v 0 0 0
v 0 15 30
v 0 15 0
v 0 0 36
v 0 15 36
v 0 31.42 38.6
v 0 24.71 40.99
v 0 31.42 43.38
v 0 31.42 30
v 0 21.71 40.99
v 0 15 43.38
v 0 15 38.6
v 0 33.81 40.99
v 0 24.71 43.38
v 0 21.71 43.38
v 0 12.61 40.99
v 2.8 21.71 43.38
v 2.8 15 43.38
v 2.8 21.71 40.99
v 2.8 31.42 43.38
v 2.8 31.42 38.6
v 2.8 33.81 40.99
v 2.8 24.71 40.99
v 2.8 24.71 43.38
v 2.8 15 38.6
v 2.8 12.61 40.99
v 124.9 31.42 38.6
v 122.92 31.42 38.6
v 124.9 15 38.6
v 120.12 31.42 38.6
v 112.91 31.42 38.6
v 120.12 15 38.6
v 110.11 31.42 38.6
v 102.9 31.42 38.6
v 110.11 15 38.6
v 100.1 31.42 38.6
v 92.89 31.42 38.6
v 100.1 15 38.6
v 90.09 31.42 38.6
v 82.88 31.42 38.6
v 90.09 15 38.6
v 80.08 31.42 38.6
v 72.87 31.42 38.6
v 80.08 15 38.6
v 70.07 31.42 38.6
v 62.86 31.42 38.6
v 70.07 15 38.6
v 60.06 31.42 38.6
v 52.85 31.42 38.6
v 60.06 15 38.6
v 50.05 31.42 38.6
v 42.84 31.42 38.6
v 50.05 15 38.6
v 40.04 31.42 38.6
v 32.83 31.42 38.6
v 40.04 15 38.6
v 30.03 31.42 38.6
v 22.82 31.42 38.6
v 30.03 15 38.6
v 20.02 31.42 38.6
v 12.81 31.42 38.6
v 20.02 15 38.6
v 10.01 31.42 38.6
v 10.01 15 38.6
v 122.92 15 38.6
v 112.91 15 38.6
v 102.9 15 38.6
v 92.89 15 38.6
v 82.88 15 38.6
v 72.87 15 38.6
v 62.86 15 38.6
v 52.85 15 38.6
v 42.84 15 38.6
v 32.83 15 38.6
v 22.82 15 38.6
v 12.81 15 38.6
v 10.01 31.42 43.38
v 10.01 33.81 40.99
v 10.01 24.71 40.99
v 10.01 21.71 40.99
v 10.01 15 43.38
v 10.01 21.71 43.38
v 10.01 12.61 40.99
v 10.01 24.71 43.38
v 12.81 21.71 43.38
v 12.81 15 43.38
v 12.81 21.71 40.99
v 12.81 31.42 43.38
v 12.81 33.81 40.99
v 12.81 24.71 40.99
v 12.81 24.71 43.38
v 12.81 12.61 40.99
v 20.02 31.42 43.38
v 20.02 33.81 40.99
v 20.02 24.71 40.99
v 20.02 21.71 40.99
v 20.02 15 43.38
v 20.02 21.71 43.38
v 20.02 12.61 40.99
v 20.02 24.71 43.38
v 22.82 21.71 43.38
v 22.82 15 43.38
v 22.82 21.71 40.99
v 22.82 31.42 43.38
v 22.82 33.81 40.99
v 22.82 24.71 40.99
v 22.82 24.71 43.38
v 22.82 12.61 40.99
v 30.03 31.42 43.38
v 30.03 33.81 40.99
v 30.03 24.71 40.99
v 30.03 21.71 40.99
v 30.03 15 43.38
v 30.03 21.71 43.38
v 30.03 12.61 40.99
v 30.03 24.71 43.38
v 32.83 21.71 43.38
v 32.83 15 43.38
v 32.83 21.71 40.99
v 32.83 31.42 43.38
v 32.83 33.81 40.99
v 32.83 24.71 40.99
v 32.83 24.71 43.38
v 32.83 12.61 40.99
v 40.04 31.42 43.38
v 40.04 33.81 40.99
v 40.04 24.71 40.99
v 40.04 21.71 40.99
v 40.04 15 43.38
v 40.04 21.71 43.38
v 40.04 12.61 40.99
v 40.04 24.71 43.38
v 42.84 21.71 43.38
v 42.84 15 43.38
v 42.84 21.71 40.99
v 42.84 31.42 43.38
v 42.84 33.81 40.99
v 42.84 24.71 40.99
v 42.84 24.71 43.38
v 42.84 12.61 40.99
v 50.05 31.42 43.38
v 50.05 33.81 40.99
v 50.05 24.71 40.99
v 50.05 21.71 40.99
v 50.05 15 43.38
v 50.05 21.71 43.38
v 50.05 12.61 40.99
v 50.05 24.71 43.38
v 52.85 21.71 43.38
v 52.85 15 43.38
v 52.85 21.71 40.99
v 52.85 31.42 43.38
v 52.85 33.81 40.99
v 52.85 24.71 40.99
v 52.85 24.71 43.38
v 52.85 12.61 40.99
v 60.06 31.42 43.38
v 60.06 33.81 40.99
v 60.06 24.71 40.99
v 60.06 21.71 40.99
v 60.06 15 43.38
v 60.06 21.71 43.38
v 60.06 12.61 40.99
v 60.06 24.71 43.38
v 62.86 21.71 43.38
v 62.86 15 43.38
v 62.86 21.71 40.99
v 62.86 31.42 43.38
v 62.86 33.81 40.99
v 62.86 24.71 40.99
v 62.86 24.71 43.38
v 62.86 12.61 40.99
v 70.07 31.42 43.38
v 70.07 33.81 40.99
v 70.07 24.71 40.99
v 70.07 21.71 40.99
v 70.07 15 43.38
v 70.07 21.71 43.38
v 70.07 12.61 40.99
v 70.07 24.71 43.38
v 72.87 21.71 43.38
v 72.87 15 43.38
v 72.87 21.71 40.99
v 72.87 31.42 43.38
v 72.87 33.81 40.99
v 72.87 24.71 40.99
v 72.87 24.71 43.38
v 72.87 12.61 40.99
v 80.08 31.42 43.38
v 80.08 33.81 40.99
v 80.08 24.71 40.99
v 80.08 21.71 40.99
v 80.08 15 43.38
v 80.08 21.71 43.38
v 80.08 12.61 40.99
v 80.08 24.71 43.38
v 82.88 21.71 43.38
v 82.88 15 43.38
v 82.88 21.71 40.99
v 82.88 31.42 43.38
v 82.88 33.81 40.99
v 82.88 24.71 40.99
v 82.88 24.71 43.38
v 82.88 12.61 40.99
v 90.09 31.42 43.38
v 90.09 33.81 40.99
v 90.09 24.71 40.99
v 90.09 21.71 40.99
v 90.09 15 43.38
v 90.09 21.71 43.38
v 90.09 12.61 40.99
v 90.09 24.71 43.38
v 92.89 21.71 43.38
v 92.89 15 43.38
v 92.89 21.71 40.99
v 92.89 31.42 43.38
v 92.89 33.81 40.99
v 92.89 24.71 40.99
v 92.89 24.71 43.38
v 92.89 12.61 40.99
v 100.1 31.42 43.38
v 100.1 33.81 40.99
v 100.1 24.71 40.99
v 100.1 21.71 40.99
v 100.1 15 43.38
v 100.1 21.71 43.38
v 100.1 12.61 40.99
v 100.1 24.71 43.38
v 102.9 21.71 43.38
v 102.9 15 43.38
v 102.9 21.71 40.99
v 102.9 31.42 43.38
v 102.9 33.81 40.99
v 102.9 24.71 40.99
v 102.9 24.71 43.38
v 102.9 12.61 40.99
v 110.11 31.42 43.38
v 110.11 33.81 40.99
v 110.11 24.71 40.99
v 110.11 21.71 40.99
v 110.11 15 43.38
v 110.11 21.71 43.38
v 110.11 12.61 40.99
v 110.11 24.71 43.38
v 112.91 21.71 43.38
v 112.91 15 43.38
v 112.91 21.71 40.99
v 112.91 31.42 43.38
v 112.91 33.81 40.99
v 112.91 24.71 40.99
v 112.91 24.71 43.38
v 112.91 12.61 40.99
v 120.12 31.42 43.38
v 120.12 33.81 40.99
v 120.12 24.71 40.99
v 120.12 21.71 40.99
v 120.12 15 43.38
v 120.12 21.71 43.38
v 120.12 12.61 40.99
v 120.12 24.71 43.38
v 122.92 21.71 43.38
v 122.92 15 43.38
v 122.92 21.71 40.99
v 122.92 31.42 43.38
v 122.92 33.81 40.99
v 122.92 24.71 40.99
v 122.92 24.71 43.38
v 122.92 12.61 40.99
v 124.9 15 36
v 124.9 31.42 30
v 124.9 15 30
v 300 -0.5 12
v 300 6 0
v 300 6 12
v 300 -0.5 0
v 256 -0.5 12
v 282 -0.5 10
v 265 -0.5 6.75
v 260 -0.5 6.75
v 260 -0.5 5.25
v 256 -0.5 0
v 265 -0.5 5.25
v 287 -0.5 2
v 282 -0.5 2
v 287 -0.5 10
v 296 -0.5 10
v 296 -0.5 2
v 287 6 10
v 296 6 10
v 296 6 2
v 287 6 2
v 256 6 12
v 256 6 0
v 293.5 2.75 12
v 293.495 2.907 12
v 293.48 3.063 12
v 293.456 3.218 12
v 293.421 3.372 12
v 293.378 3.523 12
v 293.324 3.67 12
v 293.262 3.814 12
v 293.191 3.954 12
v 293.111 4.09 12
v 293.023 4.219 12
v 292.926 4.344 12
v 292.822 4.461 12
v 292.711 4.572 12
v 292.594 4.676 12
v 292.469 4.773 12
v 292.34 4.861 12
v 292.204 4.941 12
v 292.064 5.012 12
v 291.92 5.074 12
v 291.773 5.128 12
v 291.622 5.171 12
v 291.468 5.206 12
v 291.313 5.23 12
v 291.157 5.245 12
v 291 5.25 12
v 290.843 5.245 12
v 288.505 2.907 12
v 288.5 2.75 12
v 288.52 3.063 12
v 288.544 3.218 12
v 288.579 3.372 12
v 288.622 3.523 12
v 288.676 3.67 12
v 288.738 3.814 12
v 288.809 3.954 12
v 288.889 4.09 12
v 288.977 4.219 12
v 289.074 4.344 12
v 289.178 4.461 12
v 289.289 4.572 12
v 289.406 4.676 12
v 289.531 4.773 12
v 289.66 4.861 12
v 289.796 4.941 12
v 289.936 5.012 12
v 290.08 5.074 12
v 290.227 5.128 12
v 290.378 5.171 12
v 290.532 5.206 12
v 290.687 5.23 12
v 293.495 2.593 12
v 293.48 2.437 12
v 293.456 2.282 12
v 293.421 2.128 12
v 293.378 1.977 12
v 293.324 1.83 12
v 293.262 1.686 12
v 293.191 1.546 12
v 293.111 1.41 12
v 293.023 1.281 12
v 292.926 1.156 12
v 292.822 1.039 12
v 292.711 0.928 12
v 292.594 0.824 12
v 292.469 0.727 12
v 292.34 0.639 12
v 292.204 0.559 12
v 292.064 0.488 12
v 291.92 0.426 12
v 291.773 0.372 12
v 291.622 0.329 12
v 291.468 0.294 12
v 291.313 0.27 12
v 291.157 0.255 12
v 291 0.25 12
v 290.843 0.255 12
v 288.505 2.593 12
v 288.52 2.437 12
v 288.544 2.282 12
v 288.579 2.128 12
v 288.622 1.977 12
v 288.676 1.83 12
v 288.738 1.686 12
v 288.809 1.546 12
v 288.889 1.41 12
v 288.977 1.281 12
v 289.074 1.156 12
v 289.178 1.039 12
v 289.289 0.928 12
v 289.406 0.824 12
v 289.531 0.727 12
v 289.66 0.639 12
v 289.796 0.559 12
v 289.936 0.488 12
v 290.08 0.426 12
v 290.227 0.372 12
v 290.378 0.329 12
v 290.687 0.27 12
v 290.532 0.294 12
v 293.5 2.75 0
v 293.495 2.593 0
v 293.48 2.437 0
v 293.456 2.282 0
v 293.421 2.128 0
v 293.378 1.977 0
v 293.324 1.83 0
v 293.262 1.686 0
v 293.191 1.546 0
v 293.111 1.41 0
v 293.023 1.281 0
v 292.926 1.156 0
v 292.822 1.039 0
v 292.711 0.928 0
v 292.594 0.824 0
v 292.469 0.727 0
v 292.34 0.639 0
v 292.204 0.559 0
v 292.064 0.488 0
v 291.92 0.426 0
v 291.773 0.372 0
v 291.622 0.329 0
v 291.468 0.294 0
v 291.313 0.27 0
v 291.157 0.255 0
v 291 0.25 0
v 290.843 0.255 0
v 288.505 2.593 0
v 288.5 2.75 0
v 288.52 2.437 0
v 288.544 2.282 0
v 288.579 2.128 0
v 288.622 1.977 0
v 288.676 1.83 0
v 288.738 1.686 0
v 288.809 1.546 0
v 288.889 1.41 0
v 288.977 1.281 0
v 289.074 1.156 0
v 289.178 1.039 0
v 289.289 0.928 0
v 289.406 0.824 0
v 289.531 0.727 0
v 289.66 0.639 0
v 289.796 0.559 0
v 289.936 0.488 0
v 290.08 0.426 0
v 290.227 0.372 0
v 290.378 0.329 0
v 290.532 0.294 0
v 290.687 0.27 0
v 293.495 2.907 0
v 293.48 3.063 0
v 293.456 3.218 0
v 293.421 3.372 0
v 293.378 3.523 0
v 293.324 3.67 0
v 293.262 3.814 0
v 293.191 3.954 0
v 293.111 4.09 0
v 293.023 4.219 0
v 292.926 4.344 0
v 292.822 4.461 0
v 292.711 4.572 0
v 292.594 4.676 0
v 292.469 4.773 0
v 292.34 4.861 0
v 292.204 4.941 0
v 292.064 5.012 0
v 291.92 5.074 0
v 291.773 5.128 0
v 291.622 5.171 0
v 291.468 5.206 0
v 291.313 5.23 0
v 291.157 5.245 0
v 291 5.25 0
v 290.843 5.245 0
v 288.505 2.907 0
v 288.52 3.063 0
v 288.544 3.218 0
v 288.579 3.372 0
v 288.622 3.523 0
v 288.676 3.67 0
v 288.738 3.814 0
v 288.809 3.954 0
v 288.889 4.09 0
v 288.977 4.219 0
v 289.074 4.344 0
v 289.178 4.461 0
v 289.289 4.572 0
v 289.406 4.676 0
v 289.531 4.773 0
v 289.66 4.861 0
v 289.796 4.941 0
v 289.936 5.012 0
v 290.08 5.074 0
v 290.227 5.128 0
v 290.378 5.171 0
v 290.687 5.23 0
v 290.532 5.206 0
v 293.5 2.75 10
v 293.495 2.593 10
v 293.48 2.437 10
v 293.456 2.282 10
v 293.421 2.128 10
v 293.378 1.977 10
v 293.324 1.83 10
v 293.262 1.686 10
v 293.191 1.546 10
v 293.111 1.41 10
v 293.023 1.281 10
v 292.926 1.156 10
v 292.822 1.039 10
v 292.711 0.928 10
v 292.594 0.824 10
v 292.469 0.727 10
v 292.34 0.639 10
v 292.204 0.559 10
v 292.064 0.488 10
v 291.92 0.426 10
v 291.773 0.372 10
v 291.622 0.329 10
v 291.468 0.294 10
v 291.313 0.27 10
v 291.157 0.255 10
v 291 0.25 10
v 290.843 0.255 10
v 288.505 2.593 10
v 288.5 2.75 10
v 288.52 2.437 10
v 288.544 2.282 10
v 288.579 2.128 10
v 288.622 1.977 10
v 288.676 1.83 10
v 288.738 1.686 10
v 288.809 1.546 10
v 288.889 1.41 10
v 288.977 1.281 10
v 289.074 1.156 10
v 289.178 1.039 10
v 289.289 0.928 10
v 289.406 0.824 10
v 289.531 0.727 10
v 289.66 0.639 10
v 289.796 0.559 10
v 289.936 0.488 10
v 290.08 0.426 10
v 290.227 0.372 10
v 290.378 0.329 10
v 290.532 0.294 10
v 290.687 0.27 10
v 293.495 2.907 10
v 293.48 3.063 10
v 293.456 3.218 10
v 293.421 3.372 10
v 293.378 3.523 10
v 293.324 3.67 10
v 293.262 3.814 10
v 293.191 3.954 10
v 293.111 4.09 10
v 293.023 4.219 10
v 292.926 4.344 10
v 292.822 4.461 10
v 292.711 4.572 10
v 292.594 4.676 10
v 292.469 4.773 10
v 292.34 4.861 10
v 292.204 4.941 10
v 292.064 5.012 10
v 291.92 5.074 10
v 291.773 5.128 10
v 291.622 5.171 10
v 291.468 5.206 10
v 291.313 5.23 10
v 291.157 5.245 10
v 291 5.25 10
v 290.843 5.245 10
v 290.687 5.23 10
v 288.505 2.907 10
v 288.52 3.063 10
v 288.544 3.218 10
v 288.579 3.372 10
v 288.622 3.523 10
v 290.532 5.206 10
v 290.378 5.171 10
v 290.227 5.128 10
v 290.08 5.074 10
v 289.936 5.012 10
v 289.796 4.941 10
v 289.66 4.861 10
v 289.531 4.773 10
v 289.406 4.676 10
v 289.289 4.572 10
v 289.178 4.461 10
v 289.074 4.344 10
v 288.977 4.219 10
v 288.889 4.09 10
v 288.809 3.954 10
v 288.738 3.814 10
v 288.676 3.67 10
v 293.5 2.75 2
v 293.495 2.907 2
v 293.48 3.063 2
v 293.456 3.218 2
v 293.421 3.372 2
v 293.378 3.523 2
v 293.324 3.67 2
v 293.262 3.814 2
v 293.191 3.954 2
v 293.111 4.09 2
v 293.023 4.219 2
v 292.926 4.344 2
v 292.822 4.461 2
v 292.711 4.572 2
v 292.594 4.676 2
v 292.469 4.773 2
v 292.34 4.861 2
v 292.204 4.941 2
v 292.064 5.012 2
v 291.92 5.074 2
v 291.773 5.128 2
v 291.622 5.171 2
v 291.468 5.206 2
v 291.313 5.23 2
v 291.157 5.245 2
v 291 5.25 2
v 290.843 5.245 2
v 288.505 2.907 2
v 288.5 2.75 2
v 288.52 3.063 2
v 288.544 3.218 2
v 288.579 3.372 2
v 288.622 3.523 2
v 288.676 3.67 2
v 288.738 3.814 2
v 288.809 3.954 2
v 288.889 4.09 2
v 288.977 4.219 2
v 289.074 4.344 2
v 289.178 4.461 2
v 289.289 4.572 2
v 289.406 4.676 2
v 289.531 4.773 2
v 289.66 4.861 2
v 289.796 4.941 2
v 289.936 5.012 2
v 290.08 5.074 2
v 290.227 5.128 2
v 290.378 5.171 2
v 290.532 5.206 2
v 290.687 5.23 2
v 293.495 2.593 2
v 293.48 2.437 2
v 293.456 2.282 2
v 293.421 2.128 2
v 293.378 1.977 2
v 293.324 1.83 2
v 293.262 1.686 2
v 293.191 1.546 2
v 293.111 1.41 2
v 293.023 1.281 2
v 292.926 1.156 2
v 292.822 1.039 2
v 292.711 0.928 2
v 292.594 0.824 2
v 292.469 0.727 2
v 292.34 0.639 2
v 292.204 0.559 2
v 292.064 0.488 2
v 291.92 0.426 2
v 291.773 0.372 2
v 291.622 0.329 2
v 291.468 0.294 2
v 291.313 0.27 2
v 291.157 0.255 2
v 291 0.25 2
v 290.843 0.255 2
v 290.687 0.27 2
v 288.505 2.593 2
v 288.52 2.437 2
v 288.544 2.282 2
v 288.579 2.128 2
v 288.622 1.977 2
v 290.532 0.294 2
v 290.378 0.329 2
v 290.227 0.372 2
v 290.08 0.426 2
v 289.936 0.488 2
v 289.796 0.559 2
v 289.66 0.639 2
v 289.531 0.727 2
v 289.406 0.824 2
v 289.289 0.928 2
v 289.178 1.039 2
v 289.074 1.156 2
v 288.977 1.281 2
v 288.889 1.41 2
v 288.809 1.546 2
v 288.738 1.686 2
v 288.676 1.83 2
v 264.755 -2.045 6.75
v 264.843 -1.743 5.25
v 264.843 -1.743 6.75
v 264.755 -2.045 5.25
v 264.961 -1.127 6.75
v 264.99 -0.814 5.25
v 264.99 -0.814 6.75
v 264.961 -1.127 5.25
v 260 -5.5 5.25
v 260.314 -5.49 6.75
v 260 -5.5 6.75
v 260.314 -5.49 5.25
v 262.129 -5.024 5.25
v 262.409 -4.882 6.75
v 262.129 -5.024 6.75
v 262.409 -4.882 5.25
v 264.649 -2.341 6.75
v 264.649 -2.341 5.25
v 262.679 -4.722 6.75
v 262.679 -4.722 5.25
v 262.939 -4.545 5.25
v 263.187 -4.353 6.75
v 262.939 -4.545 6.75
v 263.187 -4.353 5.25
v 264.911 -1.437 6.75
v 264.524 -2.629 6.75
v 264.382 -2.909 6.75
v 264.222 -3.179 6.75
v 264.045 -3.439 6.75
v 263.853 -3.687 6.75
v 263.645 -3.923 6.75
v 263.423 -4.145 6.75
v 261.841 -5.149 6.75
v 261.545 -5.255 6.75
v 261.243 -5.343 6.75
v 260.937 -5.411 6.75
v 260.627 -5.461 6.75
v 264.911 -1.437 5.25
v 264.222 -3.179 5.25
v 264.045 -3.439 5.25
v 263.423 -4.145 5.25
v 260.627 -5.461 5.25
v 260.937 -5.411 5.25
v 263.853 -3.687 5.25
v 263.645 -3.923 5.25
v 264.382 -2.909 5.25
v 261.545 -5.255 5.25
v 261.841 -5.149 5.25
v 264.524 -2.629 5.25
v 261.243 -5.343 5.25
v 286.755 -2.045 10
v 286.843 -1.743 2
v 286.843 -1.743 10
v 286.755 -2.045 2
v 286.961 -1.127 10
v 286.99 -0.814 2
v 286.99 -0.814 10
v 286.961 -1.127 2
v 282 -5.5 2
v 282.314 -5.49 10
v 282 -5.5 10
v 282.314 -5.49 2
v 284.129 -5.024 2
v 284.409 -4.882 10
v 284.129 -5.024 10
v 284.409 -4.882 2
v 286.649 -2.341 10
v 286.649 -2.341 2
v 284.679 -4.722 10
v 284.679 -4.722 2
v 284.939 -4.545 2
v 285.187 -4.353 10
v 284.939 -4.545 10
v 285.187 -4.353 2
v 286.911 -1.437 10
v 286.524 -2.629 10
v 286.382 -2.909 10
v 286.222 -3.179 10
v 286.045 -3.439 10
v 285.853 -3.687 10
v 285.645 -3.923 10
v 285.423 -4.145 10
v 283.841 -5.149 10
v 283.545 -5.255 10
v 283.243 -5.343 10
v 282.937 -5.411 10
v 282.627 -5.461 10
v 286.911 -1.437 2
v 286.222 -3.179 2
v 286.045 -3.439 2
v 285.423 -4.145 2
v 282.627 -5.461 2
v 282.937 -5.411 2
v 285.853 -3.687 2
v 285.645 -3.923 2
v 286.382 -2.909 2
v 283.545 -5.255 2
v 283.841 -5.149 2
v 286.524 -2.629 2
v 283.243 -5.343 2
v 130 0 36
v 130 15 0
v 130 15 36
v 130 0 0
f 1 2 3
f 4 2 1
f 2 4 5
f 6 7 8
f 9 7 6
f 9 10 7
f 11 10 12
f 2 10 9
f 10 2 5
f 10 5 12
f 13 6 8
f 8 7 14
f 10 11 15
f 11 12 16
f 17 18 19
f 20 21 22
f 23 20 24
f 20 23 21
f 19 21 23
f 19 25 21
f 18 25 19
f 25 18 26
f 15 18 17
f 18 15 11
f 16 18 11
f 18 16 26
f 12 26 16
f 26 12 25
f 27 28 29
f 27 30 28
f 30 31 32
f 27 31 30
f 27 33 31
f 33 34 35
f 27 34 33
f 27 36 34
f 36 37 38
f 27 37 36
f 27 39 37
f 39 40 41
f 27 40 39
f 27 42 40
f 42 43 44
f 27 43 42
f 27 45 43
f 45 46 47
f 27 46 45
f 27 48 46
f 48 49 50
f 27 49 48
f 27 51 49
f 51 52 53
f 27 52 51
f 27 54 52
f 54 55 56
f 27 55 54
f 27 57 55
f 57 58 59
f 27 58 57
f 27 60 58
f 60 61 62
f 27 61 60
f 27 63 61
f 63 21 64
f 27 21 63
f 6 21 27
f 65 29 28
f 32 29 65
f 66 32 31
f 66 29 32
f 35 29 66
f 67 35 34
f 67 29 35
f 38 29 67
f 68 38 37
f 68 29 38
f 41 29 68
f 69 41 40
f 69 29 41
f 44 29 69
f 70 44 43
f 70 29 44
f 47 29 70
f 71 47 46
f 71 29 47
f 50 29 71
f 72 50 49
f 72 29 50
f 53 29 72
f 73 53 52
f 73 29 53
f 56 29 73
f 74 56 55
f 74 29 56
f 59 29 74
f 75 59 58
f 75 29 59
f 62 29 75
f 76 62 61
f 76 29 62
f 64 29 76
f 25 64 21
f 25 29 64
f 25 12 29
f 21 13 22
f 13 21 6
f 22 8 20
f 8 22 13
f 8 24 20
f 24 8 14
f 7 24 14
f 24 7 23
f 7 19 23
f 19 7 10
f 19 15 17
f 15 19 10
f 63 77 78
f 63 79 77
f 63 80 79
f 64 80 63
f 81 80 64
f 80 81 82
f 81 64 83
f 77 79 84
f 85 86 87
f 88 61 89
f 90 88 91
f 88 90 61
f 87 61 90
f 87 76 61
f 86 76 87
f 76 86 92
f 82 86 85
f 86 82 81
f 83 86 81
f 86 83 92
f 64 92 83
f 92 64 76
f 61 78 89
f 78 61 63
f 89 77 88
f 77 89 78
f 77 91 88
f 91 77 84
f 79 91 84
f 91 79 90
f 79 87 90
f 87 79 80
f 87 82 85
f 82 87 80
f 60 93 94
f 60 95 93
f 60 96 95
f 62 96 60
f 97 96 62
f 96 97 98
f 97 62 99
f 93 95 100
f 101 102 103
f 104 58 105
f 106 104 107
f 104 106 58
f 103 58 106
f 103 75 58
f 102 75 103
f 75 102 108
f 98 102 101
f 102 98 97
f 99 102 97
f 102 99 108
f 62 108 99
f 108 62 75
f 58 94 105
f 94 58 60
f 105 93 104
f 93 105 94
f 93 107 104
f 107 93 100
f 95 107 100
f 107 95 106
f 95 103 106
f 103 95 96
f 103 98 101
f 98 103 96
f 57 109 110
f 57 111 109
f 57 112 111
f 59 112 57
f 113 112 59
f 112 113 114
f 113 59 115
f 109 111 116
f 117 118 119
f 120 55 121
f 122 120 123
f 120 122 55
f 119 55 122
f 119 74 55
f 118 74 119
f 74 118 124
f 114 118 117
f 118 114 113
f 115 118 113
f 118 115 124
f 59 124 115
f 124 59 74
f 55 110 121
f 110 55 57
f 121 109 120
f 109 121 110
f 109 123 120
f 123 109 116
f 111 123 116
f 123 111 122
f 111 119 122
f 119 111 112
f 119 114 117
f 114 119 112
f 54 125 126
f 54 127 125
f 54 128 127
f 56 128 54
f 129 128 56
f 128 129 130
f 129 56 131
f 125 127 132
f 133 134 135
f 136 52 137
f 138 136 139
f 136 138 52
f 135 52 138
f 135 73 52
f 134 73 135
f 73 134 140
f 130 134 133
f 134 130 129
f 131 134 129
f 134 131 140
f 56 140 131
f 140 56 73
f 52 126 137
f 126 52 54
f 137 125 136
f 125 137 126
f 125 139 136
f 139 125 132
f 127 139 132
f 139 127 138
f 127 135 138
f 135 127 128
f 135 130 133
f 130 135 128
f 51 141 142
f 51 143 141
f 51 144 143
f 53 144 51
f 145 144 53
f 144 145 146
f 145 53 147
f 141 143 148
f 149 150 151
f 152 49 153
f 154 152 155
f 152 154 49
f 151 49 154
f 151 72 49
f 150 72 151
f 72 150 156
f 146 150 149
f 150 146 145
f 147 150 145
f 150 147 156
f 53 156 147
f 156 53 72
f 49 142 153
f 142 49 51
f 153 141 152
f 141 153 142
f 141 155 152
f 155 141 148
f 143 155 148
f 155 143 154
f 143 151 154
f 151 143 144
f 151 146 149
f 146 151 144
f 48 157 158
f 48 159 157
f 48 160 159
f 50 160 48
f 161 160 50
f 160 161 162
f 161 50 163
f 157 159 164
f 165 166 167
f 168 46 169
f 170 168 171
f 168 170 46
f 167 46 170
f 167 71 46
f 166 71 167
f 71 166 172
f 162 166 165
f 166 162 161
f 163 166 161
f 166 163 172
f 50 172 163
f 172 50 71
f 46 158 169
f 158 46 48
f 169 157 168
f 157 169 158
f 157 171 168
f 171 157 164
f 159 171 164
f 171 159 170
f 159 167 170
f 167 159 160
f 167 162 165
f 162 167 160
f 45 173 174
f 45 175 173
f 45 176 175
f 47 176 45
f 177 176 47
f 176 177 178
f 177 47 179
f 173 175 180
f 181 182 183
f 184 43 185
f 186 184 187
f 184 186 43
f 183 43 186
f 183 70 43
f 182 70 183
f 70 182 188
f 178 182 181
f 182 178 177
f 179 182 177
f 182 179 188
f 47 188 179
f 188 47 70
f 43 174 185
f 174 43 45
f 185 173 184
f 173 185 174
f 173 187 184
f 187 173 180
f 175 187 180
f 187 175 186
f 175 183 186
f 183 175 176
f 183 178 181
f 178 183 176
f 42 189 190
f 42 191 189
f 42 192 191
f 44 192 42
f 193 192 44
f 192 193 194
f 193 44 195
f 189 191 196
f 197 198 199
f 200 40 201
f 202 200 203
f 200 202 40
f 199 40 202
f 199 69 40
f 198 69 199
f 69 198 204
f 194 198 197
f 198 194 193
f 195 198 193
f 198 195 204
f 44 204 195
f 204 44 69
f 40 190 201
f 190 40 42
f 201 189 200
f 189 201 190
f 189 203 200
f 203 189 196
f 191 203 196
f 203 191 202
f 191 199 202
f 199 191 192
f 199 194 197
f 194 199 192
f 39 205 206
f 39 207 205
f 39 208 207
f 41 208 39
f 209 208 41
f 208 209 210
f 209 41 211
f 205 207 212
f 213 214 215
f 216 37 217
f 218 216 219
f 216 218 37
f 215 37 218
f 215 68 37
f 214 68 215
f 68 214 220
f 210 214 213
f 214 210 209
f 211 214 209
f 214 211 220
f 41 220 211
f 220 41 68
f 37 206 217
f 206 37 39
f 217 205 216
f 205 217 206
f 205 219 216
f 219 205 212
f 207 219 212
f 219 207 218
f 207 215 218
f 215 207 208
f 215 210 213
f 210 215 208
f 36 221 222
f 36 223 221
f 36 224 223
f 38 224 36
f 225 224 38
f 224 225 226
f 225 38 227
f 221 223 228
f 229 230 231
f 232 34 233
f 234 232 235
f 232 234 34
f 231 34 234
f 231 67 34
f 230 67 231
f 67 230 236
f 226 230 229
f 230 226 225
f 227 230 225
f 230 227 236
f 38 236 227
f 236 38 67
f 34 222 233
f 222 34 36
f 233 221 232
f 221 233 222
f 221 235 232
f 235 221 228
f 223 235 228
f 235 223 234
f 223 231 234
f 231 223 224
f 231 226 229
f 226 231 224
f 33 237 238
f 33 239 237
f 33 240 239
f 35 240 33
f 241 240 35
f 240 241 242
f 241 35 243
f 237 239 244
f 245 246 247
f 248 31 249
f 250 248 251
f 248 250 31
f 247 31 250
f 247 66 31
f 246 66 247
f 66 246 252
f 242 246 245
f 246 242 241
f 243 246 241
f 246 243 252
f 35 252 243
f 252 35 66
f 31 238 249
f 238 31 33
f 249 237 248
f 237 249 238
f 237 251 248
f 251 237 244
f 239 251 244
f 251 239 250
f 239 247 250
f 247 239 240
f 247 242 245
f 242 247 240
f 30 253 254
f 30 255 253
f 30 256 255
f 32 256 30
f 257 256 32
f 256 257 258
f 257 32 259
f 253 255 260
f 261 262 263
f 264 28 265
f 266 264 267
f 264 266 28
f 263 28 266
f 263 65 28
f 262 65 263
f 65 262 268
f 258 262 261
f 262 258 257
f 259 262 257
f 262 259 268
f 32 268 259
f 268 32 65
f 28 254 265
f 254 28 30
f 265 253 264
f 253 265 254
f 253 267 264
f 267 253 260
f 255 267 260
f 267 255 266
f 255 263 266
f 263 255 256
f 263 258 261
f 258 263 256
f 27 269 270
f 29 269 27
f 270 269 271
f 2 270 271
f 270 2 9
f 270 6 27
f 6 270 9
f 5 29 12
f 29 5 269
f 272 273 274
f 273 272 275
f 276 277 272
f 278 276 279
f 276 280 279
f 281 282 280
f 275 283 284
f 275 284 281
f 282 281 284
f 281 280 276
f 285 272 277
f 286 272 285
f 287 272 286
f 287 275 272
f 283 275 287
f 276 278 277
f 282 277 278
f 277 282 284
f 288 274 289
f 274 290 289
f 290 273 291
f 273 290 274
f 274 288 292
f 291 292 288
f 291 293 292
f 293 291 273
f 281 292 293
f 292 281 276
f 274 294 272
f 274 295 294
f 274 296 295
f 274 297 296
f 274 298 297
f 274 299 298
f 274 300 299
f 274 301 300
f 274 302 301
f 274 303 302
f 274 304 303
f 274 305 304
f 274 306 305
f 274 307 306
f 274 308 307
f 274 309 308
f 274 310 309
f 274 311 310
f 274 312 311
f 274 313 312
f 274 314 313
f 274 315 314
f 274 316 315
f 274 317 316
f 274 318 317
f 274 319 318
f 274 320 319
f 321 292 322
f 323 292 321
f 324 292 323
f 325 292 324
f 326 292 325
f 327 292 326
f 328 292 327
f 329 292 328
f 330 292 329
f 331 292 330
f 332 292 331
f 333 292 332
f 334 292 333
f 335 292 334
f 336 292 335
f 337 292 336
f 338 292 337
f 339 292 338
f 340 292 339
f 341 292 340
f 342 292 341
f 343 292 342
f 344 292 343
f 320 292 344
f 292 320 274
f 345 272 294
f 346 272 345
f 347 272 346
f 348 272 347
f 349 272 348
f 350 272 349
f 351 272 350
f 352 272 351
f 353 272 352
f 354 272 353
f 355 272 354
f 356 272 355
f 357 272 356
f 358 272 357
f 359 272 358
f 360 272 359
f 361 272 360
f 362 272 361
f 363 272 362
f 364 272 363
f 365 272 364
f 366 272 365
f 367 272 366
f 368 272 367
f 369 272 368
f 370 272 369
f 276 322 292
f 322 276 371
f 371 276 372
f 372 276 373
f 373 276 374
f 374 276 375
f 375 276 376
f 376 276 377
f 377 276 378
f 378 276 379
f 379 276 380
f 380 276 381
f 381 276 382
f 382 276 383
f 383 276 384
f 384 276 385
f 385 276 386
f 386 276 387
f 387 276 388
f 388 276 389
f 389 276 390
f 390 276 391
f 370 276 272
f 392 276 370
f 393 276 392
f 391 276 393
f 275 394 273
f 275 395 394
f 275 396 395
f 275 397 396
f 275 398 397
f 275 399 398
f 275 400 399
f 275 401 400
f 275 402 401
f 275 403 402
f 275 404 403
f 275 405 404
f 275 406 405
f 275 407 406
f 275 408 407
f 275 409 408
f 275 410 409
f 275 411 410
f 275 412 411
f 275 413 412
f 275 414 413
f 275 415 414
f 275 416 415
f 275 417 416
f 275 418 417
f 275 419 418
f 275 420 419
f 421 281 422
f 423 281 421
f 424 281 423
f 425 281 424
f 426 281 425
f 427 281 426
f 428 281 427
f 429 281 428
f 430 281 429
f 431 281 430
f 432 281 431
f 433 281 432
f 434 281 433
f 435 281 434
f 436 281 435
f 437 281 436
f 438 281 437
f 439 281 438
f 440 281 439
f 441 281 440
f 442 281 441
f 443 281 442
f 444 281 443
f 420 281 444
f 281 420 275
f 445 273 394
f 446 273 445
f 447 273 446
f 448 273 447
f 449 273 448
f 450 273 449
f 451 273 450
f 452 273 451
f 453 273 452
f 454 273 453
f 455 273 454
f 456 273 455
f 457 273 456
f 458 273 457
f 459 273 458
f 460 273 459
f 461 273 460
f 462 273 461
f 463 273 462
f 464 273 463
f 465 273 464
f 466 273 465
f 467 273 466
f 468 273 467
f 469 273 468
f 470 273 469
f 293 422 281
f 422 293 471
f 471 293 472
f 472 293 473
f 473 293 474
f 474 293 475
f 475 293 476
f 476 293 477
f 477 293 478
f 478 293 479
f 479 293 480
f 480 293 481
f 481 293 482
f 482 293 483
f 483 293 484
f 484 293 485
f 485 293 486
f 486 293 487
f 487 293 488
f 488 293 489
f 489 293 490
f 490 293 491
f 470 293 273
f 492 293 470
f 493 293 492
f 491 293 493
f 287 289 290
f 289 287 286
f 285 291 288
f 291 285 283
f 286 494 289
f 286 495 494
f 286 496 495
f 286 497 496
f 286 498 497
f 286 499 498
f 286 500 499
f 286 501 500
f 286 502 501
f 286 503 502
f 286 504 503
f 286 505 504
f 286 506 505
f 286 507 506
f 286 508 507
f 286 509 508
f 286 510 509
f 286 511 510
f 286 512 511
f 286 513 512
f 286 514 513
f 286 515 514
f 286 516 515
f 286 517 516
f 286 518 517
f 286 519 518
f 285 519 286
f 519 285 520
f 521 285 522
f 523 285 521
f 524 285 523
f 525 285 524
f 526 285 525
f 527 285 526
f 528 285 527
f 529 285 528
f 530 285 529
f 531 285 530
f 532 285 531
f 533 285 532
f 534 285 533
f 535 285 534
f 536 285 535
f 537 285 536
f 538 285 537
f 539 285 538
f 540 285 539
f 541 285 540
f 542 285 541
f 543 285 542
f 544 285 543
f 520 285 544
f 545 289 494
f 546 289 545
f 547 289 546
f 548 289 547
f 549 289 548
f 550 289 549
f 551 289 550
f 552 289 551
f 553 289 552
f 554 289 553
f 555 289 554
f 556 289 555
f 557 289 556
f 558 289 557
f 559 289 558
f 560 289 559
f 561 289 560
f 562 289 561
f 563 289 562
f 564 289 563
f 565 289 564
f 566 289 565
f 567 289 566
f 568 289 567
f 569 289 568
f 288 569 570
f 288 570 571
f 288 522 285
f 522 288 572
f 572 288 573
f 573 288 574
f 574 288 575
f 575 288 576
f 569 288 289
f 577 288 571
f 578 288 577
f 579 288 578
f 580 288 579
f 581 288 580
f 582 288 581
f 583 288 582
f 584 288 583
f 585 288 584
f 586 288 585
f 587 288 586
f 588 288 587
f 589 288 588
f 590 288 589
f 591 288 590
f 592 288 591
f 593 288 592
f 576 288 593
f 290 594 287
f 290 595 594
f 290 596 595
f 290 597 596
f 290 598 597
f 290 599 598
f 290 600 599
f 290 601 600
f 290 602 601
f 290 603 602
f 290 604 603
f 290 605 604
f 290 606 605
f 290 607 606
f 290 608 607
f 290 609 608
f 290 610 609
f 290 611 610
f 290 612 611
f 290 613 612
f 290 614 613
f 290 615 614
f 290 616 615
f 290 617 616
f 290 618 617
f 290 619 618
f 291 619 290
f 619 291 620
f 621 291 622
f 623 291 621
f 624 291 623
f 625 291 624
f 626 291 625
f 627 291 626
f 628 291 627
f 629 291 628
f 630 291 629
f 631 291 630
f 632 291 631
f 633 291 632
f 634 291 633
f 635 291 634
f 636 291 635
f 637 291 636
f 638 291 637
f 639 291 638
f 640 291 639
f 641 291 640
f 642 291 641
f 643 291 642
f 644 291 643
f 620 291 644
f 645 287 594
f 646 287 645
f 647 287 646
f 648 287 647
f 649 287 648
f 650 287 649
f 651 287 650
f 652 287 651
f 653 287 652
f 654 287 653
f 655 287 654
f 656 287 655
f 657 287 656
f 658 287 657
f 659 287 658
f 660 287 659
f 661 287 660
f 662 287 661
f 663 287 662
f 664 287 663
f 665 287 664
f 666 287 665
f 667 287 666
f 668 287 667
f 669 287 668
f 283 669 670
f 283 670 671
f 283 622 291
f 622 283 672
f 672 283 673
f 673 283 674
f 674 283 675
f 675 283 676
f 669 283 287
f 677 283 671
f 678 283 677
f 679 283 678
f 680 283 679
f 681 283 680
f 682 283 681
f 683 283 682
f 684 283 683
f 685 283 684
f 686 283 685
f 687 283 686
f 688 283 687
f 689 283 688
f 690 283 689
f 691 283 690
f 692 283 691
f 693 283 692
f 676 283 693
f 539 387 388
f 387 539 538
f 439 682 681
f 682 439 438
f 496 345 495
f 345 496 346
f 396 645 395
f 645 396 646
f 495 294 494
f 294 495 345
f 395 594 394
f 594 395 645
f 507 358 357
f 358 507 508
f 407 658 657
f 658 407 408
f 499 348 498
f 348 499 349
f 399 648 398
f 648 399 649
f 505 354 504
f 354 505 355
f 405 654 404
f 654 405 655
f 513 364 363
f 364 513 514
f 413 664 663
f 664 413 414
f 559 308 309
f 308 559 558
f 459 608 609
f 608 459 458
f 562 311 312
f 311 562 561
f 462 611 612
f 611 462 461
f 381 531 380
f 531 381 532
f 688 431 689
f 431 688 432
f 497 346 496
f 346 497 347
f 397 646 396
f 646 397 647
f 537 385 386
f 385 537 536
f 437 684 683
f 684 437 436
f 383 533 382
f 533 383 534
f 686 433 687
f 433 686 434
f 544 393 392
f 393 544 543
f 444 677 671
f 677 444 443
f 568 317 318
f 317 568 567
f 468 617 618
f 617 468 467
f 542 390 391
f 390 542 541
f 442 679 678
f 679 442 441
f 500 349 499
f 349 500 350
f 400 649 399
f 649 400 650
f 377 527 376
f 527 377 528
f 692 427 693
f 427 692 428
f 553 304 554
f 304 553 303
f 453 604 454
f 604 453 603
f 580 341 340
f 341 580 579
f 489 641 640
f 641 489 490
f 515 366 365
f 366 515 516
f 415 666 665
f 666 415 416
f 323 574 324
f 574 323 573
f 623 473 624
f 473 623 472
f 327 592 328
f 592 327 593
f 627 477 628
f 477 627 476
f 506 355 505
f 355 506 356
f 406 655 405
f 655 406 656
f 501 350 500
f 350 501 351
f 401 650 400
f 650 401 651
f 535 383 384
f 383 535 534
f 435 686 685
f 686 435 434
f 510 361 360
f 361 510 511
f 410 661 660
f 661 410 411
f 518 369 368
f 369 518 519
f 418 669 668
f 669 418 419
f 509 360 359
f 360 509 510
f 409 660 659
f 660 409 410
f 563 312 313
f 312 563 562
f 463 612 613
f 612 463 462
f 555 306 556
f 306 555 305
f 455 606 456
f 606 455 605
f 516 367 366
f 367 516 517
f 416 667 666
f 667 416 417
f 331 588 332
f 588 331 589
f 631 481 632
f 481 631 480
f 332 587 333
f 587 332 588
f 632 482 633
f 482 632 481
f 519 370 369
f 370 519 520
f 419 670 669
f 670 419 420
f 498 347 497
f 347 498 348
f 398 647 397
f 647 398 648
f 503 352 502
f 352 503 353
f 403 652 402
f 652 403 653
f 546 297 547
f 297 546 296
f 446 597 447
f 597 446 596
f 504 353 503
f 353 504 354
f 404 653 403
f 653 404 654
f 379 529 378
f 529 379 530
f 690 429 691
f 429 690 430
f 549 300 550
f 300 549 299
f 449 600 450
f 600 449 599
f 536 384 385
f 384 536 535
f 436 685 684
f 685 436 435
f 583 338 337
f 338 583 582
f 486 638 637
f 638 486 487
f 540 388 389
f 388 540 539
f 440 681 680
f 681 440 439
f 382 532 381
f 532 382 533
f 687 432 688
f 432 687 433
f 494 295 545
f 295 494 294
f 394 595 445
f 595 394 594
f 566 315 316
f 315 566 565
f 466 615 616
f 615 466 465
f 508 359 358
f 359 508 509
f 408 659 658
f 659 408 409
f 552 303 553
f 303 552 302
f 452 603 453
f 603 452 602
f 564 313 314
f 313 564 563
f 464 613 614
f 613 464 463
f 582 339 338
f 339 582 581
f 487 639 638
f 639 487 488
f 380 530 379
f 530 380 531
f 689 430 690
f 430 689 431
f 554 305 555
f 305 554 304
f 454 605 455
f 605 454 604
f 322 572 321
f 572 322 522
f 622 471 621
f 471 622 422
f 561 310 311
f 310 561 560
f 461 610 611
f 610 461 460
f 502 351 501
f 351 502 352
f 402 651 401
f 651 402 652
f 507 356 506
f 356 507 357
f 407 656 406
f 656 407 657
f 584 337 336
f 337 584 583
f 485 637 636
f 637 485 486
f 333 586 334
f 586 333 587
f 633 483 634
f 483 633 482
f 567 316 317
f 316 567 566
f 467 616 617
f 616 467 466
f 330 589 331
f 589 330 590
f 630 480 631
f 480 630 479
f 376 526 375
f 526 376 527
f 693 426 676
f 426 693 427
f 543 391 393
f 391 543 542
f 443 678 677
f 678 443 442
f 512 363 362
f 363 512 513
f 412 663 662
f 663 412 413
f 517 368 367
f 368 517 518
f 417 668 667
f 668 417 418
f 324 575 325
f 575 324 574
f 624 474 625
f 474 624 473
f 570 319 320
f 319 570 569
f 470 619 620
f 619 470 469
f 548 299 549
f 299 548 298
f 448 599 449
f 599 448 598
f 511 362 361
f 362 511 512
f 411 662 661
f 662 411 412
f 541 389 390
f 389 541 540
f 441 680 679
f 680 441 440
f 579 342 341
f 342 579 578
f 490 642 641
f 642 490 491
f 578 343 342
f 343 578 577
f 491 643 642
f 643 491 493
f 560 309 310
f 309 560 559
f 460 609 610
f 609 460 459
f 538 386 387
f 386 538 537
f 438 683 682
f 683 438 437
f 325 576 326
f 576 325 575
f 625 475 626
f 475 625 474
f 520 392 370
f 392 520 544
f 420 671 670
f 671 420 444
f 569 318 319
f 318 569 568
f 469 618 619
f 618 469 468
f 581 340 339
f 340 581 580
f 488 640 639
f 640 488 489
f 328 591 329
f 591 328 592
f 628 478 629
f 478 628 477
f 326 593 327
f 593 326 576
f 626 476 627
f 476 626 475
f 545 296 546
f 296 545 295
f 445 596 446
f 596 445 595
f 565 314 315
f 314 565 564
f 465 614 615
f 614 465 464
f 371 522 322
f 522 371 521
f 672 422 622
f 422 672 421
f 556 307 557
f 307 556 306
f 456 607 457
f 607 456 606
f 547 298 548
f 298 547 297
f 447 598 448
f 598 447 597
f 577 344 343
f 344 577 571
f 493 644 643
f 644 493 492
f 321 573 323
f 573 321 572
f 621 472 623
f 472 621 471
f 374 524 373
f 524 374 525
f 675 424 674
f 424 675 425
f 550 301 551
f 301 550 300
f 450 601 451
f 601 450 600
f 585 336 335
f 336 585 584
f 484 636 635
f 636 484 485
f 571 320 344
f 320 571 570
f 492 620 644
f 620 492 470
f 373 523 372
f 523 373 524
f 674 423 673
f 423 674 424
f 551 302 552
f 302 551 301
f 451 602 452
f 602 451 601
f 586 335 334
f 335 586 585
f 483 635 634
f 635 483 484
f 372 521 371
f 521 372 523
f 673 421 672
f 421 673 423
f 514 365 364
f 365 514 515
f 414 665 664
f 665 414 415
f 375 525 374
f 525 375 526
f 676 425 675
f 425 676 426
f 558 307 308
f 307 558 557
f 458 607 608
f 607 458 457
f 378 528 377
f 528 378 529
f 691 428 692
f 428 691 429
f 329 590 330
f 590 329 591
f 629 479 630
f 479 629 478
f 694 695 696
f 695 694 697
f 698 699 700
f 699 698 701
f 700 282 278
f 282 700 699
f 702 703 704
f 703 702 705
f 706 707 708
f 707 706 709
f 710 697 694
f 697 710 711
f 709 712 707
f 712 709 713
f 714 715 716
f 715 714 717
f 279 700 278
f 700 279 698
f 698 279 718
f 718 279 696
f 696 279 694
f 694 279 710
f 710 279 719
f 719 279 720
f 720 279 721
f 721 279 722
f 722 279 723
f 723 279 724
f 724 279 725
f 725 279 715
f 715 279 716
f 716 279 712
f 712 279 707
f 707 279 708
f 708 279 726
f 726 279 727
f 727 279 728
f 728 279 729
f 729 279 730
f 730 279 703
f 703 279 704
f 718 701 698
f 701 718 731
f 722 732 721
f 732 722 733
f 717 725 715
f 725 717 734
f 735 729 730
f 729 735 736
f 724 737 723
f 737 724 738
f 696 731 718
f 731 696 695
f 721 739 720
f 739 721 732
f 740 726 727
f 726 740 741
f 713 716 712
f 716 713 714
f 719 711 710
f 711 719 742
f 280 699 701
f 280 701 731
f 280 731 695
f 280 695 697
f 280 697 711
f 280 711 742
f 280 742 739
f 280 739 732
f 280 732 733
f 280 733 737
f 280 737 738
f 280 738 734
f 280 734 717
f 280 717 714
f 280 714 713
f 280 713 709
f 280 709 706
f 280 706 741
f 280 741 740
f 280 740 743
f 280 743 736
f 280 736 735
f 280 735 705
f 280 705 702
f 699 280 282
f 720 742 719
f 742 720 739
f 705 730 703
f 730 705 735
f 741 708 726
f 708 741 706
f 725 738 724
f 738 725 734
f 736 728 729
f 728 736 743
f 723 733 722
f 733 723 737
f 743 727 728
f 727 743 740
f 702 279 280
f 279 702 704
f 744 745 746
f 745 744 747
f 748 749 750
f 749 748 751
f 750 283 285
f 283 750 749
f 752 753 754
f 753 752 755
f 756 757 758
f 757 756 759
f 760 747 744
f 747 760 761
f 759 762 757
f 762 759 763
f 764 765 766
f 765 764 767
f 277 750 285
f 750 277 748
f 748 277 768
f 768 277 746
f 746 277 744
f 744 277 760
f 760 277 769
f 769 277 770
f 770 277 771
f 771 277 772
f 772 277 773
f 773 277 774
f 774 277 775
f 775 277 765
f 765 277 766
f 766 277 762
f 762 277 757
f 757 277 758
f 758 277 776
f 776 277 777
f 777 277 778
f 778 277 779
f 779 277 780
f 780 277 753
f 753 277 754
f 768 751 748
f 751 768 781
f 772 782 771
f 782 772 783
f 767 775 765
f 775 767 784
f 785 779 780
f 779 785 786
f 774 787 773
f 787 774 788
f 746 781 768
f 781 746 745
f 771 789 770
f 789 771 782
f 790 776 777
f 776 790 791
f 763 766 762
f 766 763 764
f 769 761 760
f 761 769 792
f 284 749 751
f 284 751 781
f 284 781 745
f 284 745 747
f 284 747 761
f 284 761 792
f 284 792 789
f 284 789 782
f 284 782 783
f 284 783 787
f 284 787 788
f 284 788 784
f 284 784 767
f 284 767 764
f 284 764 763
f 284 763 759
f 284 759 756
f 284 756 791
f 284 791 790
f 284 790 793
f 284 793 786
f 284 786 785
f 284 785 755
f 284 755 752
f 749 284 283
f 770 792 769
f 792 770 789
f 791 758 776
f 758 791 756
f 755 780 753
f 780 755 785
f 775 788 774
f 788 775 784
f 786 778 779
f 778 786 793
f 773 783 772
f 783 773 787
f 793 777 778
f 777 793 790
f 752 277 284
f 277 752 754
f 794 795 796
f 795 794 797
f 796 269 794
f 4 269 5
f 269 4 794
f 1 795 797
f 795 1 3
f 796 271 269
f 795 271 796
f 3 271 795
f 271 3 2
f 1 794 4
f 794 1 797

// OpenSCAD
$fn = 100;

/** VARIABLES **/
// Hook
HOOK_LENGTH = 44;
HOOK_WIDTH = 12;
HOOK_HEIGHT = 6.5;
HOOK_FIX_HEIGHT = 5;
HOOK_HOLE = 2.5;
HOOK_HOLE_RIGHT = 6.5;
HOOK_HOLE_LEFT = 35;

// Rail
RAIL_LENGTH = 124.9;
RAIL_WIDTH = 21.2;
RAIL_HEIGHT = 8.6;

// Encoche
ENCOCHE_LENGTH = 4.78;
ENCOCHE_WIDTH = 15.6;
ENCOCHE_HEIGHT = 2.8;
ENCOCHE_SEPARATOR = 5.23;
ENCOCHE_ANGLE_SIZE = (RAIL_WIDTH - ENCOCHE_WIDTH) / 2; // =2.8
ENCOCHE_HOLE = 3;

// Weapon fix
FRONT_WEAPON_FIX_LENGTH = 130;
BACK_WEAPON_FIX_LENGTH = 170;
WEAPON_SEPARATOR = FRONT_WEAPON_FIX_LENGTH + (BACK_WEAPON_FIX_LENGTH - HOOK_LENGTH);
WEAPON_FIX_WIDTH = 15;
WEAPON_FIX_HEIGHT = 30;

// Weapon fix holes
FRONT_WEAPON = 70;
FRONT_HOLE = 15;
BACK_HOLE_LENGHT = 98;
BACK_HOLE_WIDTH = 8;
BACK_HOLE_HEIGHT = 10;

/** Canon hook **/
// Core
module canonHook() {
    union() {
        difference() {
            difference() {  
                cube([HOOK_LENGTH, HOOK_WIDTH, HOOK_HEIGHT]);
                translate([HOOK_HOLE_LEFT - 4, 2, -1]) cube([HOOK_WIDTH - 3, HOOK_WIDTH - 4, 20]);
            }
            translate([HOOK_HOLE_LEFT, 20, HOOK_HEIGHT / 2]) rotate([90, 0, 0]) cylinder(h=30, r=HOOK_HOLE);
        }
        translate([4, HOOK_WIDTH / 2 + 1.5 / 2, HOOK_HEIGHT]) curveHook(1.5, HOOK_FIX_HEIGHT);
        translate([HOOK_HOLE_LEFT - HOOK_FIX_HEIGHT - 4 , HOOK_WIDTH - 4 +2, HOOK_HEIGHT]) fixHook(HOOK_WIDTH - 4, HOOK_FIX_HEIGHT);
    }
}

// Curve to fit the holes
module curveHook(height, raduis) {
    difference() {
        rotate([90, 0, 0]) cylinder(h=height, r=raduis);
        translate([-HOOK_FIX_HEIGHT, -2, - raduis - 1]) cube([5, 5, 20]);
    }
}

// Fix to fit the holes
module fixHook(height, raduis) {
    difference() {
        rotate([90, 0, 0]) cylinder(h=height, r=raduis);
        translate([-5, -15, - raduis - 1]) cube([5, 20, 20]);
    }
}

/** Front Weapon Fix **/
module weaponFix() {
    difference() {
        translate([0, 0, 0]) cube([FRONT_WEAPON_FIX_LENGTH, WEAPON_FIX_WIDTH, WEAPON_FIX_HEIGHT + 6]);
    }
}


/** Holder **/
// Rail : https://pinshape.com/items/53040-3d-printed-kar98k-picattiny-rail
module rail() {
    translate([0, ENCOCHE_LENGTH / 2, 0]) cube([RAIL_LENGTH, RAIL_WIDTH - ENCOCHE_LENGTH, RAIL_HEIGHT]);

    // Create all the encoches
    separator = 0;
    for (i = [0:1:12]) {
        translate([separator, RAIL_WIDTH / 2, RAIL_HEIGHT]) rotate([90, 0, 90]) encocheRail();
        separator = i * (ENCOCHE_SEPARATOR + ENCOCHE_LENGTH);
    }
}

module encocheRail() {
    linear_extrude(height = ENCOCHE_HEIGHT) {
        encocheRailPolygon();
        mirror([1,0,0]) {
            encocheRailPolygon();
        }
    }
} 

module encocheRailPolygon() {
    polygon(points=[ 
        [0, 0],
        [RAIL_WIDTH / 2 - ENCOCHE_LENGTH / 2, 0], 
        [RAIL_WIDTH / 2, ENCOCHE_LENGTH / 2],
        [RAIL_WIDTH / 2 - ENCOCHE_LENGTH / 2, ENCOCHE_LENGTH], 
        [ENCOCHE_HOLE / 2, ENCOCHE_LENGTH], 
        [ENCOCHE_HOLE / 2, ENCOCHE_LENGTH / 2], 
        [0, ENCOCHE_LENGTH / 2]
    ]);
}

/** VIEW **/
assembling = true;
if (assembling) {
    weaponFix();
    translate([0, WEAPON_FIX_WIDTH - ENCOCHE_LENGTH / 2, WEAPON_FIX_HEIGHT]) rail();
    translate([WEAPON_SEPARATOR, HOOK_WIDTH / 2, 0]) rotate([90, 0, 0]) canonHook();
} else {
    canonHook();
    translate([0, 50, 0]) rail();
    translate([0, 100, 0]) weaponFix();
}
